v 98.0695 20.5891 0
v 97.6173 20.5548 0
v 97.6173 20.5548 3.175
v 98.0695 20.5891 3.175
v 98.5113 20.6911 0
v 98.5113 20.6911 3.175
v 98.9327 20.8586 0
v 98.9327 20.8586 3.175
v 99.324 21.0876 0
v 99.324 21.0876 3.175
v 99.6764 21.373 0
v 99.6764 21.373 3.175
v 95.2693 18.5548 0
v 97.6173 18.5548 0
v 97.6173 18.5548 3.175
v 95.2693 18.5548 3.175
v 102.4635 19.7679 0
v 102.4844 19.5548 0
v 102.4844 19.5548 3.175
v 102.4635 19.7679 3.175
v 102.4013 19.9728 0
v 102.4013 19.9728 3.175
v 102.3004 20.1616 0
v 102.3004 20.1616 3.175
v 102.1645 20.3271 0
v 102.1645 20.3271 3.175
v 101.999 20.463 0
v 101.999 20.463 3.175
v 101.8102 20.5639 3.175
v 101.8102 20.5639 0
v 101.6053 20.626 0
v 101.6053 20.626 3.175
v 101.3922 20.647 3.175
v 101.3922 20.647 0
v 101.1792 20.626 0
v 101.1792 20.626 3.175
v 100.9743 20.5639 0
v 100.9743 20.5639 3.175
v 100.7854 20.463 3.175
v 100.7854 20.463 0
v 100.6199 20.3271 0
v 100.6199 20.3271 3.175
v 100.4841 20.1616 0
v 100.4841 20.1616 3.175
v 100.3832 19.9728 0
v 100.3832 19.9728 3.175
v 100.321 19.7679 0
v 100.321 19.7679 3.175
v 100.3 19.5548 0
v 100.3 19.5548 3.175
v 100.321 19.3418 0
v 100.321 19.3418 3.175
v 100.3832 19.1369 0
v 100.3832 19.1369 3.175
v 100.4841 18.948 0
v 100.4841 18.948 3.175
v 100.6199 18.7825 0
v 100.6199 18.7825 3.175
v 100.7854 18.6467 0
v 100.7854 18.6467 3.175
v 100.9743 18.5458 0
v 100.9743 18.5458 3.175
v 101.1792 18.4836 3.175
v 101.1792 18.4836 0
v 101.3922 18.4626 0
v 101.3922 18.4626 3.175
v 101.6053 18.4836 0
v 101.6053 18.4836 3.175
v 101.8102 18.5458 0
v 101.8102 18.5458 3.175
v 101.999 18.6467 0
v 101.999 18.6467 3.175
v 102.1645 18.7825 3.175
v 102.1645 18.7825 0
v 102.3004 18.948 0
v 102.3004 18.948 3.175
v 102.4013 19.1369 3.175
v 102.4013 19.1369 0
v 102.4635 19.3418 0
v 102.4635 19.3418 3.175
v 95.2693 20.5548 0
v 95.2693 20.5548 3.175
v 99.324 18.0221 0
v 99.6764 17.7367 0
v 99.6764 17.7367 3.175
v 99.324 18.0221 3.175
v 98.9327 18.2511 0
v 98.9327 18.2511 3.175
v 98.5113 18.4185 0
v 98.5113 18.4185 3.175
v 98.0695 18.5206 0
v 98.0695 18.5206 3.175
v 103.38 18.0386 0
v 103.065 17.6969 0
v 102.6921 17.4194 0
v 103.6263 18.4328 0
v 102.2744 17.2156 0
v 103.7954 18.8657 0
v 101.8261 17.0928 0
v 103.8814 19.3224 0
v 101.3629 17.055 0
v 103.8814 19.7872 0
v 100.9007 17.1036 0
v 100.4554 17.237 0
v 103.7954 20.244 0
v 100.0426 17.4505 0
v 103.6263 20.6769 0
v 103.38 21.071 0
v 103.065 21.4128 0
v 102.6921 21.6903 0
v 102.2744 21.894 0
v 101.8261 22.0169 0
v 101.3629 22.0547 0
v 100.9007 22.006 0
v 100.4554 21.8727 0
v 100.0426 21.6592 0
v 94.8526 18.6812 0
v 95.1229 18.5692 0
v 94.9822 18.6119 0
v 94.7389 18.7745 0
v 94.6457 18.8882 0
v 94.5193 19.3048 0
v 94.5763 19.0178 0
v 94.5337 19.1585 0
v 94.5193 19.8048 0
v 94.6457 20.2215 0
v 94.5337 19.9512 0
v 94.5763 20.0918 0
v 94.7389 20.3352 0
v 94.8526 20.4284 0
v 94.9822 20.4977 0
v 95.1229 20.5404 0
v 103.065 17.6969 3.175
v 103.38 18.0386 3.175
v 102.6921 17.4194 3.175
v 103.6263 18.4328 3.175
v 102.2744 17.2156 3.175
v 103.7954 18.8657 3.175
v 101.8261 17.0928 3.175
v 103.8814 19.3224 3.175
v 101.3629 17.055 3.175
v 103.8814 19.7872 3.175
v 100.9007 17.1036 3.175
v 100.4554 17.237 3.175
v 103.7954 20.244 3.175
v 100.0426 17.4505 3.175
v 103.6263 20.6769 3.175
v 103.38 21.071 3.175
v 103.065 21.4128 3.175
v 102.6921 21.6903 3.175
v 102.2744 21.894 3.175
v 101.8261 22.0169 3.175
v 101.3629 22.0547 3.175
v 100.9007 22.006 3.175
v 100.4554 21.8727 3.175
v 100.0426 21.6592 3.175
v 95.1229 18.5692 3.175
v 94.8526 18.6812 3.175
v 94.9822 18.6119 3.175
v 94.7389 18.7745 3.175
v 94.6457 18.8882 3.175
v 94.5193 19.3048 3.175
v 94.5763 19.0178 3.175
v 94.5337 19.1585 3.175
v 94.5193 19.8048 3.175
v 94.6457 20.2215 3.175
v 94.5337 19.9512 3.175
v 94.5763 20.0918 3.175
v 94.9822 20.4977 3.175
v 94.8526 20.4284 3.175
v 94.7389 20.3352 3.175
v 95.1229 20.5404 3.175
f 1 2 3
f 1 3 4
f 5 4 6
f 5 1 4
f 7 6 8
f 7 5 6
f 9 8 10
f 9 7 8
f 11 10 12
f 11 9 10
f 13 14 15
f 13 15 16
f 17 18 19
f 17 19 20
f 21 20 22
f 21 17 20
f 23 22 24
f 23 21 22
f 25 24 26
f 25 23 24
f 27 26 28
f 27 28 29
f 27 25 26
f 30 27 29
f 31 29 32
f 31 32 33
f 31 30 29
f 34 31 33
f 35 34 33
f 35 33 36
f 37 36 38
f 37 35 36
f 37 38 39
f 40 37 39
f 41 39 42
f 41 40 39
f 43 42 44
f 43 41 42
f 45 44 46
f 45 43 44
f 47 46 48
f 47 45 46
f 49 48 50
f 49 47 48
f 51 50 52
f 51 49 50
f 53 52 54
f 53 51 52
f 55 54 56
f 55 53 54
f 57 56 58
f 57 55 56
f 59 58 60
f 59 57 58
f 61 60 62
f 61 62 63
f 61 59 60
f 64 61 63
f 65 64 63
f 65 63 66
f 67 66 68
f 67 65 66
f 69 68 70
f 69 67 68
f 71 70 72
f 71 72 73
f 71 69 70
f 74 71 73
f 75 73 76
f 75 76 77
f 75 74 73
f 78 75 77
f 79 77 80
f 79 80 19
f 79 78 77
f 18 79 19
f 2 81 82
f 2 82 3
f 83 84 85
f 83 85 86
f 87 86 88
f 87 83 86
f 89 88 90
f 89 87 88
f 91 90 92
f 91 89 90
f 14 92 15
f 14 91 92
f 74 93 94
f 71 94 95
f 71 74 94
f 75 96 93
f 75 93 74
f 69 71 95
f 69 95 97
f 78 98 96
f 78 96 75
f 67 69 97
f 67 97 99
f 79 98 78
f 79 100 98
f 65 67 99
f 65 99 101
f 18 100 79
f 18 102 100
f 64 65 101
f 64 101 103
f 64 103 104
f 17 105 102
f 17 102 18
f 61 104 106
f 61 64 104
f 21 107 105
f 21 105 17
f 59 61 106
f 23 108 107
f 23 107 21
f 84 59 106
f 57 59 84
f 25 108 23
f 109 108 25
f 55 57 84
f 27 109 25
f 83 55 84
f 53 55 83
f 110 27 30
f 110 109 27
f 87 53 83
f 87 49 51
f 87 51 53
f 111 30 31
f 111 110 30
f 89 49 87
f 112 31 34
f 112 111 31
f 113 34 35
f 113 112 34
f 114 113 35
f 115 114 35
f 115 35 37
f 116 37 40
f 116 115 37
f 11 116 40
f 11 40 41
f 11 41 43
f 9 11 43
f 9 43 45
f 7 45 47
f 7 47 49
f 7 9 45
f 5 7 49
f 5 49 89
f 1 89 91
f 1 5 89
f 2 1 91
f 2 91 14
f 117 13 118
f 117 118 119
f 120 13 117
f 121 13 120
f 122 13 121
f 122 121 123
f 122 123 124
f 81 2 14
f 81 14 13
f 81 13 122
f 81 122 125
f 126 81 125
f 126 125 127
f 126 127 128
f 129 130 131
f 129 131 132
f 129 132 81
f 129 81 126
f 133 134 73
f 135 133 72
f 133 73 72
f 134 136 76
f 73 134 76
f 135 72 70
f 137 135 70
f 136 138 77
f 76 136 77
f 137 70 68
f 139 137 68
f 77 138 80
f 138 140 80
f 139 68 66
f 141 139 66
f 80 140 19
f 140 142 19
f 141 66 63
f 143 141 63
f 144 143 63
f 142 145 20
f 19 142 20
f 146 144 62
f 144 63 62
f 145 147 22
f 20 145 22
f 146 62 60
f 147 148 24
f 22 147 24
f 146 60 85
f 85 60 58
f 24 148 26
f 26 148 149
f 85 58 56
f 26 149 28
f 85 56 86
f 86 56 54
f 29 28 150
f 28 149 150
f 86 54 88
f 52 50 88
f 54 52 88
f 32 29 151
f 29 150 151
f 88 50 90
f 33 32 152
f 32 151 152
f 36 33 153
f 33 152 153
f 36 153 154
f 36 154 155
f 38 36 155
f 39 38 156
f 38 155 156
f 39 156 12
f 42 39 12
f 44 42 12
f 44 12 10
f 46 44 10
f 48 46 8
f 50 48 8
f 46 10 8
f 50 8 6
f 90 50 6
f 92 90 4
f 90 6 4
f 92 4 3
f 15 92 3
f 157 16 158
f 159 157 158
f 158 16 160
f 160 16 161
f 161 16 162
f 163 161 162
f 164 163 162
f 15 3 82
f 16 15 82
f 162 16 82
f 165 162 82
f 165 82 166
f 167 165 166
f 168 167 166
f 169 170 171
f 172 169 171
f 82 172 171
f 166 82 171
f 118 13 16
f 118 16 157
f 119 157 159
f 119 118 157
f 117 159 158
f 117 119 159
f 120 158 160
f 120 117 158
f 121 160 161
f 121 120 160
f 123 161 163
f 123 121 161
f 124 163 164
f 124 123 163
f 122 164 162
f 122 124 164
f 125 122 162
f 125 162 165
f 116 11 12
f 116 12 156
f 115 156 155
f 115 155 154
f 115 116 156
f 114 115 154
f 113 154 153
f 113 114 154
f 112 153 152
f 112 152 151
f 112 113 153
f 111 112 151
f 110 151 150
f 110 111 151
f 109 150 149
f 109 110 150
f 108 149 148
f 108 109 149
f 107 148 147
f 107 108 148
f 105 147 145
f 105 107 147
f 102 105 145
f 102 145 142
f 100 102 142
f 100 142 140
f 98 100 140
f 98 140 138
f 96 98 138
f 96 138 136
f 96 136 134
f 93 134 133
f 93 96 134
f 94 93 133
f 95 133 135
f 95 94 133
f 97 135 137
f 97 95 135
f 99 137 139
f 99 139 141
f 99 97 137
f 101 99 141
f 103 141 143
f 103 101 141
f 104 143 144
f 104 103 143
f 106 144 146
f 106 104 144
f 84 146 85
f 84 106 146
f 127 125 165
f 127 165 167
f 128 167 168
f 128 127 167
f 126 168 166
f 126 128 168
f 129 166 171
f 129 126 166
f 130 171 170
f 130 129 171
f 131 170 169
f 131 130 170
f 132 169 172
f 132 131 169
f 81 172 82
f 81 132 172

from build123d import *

# Parameters (mm, degrees)
SKETCH1_R           = 1.0922
BOSS_EXTRUDE1_DEPTH = 3.175


with BuildPart() as part:
    # Sketch1 → Boss-Extrude1 (new body)
    with BuildSketch(Plane.XY):
        with BuildLine():
            Line((97.519253807, 20.554833153), (97.617319935, 20.554833153))
            ThreePointArc((97.617319935, 20.554833153), (98.725143354, 20.766872021), (99.67636569, 21.373014971))
            ThreePointArc((99.67636569, 21.373014971), (103.892237153, 19.554833153), (99.67636569, 17.736651335))
            ThreePointArc((99.67636569, 17.736651335), (98.725143354, 18.342794285), (97.617319935, 18.554833153))
            Line((97.617319935, 18.554833153), (97.519253807, 18.554833153))
            Line((97.519253807, 18.554833153), (95.269253807, 18.554833153))
            ThreePointArc((95.269253807, 18.554833153), (94.738923721, 18.774503067), (94.519253807, 19.304833153))
            Line((94.519253807, 19.304833153), (94.519253807, 19.804833153))
            ThreePointArc((94.519253807, 19.804833153), (94.738923721, 20.335163239), (95.269253807, 20.554833153))
            Line((95.269253807, 20.554833153), (97.519253807, 20.554833153))
        make_face()
        with Locations((101.392237153, 19.554833153)):
            Circle(SKETCH1_R, mode=Mode.SUBTRACT)
    extrude(amount=BOSS_EXTRUDE1_DEPTH)


solid = part.part
